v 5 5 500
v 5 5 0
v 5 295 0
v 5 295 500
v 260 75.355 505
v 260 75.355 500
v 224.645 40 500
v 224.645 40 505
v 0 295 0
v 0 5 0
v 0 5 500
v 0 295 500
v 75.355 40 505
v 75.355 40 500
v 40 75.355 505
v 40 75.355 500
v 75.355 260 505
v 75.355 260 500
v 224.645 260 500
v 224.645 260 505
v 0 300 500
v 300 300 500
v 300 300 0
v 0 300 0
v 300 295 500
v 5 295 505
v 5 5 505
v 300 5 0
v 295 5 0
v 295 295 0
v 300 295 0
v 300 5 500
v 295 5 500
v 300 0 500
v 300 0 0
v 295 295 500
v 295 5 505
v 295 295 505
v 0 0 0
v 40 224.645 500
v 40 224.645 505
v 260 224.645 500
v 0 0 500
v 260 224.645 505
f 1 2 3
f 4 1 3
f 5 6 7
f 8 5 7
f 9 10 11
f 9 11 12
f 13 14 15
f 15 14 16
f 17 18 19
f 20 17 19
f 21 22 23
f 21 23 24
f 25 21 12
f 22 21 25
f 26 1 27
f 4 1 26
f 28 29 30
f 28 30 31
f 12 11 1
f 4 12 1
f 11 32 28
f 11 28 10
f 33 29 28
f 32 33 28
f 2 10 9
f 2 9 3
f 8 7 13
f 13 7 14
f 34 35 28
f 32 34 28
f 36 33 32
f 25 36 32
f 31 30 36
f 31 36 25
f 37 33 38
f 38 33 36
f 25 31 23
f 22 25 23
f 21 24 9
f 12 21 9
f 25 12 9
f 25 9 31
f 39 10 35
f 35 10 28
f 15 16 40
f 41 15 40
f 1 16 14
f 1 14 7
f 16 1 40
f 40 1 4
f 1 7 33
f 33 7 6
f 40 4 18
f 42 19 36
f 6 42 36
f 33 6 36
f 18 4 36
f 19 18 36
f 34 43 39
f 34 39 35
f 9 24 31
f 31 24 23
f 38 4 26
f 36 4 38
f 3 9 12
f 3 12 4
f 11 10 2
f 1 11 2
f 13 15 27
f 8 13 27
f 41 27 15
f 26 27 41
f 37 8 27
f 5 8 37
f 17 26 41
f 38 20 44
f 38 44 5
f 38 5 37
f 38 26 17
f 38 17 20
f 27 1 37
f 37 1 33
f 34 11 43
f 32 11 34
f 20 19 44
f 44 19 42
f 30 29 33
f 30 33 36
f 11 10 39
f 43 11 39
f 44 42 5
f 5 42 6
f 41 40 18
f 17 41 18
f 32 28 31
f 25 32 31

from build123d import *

# Parameters (mm, degrees)
F3_DEPTH = 500
F2_W     = 5
F2_H     = 290
F4_DEPTH = 500
F5_START = 500
F2_W_2   = 290
F5_DEPTH = 5


with BuildPart() as f3:
    # F2 (on Top) → F3 (new body)
    with BuildSketch(Plane.XY):
        Polygon((0, 300), (0, 295), (5, 295), (295, 295), (300, 295), (300, 300), align=None)
    extrude(amount=F3_DEPTH)


with BuildPart() as f3b:
    # F2 (on Top) → F3, piece 2 (new body)
    with BuildSketch(Plane.XY):
        Polygon((0, 5), (0, 0), (300, 0), (300, 5), (295, 5), (5, 5), align=None)
    extrude(amount=F3_DEPTH)


with BuildPart() as f4:
    # F2 (on Top) → F4 (new body)
    with BuildSketch(Plane.XY):
        with Locations((2.5, 150)):
            Rectangle(F2_W, F2_H)
    extrude(amount=F4_DEPTH)


with BuildPart() as f4b:
    # F2 (on Top) → F4, piece 2 (new body)
    with BuildSketch(Plane.XY):
        with Locations((297.5, 150)):
            Rectangle(F2_W, F2_H)
    extrude(amount=F4_DEPTH)


with BuildPart() as f5:
    # F2 (on Top) → F5 (new body)
    with BuildSketch(Plane.XY.offset(F5_START)):
        with Locations((150, 150)):
            Rectangle(F2_W_2, F2_H)
        Polygon((40, 224.6446609407), (40, 260), (75.3553390593, 260), (224.6446609407, 260), (260, 260), (260, 224.6446609407), (260, 75.3553390593), (260, 40), (224.6446609407, 40), (75.3553390593, 40), (40, 40), (40, 75.3553390593), align=None, mode=Mode.SUBTRACT)
        Polygon((260, 260), (224.6446609407, 260), (260, 224.6446609407), align=None)
        Polygon((75.3553390593, 260), (40, 260), (40, 224.6446609407), align=None)
        Polygon((75.3553390593, 40), (40, 75.3553390593), (40, 40), align=None)
        Polygon((260, 40), (260, 75.3553390593), (224.6446609407, 40), align=None)
    extrude(amount=F5_DEPTH)


solid = Compound([f3.part, f3b.part, f4.part, f4b.part, f5.part])
